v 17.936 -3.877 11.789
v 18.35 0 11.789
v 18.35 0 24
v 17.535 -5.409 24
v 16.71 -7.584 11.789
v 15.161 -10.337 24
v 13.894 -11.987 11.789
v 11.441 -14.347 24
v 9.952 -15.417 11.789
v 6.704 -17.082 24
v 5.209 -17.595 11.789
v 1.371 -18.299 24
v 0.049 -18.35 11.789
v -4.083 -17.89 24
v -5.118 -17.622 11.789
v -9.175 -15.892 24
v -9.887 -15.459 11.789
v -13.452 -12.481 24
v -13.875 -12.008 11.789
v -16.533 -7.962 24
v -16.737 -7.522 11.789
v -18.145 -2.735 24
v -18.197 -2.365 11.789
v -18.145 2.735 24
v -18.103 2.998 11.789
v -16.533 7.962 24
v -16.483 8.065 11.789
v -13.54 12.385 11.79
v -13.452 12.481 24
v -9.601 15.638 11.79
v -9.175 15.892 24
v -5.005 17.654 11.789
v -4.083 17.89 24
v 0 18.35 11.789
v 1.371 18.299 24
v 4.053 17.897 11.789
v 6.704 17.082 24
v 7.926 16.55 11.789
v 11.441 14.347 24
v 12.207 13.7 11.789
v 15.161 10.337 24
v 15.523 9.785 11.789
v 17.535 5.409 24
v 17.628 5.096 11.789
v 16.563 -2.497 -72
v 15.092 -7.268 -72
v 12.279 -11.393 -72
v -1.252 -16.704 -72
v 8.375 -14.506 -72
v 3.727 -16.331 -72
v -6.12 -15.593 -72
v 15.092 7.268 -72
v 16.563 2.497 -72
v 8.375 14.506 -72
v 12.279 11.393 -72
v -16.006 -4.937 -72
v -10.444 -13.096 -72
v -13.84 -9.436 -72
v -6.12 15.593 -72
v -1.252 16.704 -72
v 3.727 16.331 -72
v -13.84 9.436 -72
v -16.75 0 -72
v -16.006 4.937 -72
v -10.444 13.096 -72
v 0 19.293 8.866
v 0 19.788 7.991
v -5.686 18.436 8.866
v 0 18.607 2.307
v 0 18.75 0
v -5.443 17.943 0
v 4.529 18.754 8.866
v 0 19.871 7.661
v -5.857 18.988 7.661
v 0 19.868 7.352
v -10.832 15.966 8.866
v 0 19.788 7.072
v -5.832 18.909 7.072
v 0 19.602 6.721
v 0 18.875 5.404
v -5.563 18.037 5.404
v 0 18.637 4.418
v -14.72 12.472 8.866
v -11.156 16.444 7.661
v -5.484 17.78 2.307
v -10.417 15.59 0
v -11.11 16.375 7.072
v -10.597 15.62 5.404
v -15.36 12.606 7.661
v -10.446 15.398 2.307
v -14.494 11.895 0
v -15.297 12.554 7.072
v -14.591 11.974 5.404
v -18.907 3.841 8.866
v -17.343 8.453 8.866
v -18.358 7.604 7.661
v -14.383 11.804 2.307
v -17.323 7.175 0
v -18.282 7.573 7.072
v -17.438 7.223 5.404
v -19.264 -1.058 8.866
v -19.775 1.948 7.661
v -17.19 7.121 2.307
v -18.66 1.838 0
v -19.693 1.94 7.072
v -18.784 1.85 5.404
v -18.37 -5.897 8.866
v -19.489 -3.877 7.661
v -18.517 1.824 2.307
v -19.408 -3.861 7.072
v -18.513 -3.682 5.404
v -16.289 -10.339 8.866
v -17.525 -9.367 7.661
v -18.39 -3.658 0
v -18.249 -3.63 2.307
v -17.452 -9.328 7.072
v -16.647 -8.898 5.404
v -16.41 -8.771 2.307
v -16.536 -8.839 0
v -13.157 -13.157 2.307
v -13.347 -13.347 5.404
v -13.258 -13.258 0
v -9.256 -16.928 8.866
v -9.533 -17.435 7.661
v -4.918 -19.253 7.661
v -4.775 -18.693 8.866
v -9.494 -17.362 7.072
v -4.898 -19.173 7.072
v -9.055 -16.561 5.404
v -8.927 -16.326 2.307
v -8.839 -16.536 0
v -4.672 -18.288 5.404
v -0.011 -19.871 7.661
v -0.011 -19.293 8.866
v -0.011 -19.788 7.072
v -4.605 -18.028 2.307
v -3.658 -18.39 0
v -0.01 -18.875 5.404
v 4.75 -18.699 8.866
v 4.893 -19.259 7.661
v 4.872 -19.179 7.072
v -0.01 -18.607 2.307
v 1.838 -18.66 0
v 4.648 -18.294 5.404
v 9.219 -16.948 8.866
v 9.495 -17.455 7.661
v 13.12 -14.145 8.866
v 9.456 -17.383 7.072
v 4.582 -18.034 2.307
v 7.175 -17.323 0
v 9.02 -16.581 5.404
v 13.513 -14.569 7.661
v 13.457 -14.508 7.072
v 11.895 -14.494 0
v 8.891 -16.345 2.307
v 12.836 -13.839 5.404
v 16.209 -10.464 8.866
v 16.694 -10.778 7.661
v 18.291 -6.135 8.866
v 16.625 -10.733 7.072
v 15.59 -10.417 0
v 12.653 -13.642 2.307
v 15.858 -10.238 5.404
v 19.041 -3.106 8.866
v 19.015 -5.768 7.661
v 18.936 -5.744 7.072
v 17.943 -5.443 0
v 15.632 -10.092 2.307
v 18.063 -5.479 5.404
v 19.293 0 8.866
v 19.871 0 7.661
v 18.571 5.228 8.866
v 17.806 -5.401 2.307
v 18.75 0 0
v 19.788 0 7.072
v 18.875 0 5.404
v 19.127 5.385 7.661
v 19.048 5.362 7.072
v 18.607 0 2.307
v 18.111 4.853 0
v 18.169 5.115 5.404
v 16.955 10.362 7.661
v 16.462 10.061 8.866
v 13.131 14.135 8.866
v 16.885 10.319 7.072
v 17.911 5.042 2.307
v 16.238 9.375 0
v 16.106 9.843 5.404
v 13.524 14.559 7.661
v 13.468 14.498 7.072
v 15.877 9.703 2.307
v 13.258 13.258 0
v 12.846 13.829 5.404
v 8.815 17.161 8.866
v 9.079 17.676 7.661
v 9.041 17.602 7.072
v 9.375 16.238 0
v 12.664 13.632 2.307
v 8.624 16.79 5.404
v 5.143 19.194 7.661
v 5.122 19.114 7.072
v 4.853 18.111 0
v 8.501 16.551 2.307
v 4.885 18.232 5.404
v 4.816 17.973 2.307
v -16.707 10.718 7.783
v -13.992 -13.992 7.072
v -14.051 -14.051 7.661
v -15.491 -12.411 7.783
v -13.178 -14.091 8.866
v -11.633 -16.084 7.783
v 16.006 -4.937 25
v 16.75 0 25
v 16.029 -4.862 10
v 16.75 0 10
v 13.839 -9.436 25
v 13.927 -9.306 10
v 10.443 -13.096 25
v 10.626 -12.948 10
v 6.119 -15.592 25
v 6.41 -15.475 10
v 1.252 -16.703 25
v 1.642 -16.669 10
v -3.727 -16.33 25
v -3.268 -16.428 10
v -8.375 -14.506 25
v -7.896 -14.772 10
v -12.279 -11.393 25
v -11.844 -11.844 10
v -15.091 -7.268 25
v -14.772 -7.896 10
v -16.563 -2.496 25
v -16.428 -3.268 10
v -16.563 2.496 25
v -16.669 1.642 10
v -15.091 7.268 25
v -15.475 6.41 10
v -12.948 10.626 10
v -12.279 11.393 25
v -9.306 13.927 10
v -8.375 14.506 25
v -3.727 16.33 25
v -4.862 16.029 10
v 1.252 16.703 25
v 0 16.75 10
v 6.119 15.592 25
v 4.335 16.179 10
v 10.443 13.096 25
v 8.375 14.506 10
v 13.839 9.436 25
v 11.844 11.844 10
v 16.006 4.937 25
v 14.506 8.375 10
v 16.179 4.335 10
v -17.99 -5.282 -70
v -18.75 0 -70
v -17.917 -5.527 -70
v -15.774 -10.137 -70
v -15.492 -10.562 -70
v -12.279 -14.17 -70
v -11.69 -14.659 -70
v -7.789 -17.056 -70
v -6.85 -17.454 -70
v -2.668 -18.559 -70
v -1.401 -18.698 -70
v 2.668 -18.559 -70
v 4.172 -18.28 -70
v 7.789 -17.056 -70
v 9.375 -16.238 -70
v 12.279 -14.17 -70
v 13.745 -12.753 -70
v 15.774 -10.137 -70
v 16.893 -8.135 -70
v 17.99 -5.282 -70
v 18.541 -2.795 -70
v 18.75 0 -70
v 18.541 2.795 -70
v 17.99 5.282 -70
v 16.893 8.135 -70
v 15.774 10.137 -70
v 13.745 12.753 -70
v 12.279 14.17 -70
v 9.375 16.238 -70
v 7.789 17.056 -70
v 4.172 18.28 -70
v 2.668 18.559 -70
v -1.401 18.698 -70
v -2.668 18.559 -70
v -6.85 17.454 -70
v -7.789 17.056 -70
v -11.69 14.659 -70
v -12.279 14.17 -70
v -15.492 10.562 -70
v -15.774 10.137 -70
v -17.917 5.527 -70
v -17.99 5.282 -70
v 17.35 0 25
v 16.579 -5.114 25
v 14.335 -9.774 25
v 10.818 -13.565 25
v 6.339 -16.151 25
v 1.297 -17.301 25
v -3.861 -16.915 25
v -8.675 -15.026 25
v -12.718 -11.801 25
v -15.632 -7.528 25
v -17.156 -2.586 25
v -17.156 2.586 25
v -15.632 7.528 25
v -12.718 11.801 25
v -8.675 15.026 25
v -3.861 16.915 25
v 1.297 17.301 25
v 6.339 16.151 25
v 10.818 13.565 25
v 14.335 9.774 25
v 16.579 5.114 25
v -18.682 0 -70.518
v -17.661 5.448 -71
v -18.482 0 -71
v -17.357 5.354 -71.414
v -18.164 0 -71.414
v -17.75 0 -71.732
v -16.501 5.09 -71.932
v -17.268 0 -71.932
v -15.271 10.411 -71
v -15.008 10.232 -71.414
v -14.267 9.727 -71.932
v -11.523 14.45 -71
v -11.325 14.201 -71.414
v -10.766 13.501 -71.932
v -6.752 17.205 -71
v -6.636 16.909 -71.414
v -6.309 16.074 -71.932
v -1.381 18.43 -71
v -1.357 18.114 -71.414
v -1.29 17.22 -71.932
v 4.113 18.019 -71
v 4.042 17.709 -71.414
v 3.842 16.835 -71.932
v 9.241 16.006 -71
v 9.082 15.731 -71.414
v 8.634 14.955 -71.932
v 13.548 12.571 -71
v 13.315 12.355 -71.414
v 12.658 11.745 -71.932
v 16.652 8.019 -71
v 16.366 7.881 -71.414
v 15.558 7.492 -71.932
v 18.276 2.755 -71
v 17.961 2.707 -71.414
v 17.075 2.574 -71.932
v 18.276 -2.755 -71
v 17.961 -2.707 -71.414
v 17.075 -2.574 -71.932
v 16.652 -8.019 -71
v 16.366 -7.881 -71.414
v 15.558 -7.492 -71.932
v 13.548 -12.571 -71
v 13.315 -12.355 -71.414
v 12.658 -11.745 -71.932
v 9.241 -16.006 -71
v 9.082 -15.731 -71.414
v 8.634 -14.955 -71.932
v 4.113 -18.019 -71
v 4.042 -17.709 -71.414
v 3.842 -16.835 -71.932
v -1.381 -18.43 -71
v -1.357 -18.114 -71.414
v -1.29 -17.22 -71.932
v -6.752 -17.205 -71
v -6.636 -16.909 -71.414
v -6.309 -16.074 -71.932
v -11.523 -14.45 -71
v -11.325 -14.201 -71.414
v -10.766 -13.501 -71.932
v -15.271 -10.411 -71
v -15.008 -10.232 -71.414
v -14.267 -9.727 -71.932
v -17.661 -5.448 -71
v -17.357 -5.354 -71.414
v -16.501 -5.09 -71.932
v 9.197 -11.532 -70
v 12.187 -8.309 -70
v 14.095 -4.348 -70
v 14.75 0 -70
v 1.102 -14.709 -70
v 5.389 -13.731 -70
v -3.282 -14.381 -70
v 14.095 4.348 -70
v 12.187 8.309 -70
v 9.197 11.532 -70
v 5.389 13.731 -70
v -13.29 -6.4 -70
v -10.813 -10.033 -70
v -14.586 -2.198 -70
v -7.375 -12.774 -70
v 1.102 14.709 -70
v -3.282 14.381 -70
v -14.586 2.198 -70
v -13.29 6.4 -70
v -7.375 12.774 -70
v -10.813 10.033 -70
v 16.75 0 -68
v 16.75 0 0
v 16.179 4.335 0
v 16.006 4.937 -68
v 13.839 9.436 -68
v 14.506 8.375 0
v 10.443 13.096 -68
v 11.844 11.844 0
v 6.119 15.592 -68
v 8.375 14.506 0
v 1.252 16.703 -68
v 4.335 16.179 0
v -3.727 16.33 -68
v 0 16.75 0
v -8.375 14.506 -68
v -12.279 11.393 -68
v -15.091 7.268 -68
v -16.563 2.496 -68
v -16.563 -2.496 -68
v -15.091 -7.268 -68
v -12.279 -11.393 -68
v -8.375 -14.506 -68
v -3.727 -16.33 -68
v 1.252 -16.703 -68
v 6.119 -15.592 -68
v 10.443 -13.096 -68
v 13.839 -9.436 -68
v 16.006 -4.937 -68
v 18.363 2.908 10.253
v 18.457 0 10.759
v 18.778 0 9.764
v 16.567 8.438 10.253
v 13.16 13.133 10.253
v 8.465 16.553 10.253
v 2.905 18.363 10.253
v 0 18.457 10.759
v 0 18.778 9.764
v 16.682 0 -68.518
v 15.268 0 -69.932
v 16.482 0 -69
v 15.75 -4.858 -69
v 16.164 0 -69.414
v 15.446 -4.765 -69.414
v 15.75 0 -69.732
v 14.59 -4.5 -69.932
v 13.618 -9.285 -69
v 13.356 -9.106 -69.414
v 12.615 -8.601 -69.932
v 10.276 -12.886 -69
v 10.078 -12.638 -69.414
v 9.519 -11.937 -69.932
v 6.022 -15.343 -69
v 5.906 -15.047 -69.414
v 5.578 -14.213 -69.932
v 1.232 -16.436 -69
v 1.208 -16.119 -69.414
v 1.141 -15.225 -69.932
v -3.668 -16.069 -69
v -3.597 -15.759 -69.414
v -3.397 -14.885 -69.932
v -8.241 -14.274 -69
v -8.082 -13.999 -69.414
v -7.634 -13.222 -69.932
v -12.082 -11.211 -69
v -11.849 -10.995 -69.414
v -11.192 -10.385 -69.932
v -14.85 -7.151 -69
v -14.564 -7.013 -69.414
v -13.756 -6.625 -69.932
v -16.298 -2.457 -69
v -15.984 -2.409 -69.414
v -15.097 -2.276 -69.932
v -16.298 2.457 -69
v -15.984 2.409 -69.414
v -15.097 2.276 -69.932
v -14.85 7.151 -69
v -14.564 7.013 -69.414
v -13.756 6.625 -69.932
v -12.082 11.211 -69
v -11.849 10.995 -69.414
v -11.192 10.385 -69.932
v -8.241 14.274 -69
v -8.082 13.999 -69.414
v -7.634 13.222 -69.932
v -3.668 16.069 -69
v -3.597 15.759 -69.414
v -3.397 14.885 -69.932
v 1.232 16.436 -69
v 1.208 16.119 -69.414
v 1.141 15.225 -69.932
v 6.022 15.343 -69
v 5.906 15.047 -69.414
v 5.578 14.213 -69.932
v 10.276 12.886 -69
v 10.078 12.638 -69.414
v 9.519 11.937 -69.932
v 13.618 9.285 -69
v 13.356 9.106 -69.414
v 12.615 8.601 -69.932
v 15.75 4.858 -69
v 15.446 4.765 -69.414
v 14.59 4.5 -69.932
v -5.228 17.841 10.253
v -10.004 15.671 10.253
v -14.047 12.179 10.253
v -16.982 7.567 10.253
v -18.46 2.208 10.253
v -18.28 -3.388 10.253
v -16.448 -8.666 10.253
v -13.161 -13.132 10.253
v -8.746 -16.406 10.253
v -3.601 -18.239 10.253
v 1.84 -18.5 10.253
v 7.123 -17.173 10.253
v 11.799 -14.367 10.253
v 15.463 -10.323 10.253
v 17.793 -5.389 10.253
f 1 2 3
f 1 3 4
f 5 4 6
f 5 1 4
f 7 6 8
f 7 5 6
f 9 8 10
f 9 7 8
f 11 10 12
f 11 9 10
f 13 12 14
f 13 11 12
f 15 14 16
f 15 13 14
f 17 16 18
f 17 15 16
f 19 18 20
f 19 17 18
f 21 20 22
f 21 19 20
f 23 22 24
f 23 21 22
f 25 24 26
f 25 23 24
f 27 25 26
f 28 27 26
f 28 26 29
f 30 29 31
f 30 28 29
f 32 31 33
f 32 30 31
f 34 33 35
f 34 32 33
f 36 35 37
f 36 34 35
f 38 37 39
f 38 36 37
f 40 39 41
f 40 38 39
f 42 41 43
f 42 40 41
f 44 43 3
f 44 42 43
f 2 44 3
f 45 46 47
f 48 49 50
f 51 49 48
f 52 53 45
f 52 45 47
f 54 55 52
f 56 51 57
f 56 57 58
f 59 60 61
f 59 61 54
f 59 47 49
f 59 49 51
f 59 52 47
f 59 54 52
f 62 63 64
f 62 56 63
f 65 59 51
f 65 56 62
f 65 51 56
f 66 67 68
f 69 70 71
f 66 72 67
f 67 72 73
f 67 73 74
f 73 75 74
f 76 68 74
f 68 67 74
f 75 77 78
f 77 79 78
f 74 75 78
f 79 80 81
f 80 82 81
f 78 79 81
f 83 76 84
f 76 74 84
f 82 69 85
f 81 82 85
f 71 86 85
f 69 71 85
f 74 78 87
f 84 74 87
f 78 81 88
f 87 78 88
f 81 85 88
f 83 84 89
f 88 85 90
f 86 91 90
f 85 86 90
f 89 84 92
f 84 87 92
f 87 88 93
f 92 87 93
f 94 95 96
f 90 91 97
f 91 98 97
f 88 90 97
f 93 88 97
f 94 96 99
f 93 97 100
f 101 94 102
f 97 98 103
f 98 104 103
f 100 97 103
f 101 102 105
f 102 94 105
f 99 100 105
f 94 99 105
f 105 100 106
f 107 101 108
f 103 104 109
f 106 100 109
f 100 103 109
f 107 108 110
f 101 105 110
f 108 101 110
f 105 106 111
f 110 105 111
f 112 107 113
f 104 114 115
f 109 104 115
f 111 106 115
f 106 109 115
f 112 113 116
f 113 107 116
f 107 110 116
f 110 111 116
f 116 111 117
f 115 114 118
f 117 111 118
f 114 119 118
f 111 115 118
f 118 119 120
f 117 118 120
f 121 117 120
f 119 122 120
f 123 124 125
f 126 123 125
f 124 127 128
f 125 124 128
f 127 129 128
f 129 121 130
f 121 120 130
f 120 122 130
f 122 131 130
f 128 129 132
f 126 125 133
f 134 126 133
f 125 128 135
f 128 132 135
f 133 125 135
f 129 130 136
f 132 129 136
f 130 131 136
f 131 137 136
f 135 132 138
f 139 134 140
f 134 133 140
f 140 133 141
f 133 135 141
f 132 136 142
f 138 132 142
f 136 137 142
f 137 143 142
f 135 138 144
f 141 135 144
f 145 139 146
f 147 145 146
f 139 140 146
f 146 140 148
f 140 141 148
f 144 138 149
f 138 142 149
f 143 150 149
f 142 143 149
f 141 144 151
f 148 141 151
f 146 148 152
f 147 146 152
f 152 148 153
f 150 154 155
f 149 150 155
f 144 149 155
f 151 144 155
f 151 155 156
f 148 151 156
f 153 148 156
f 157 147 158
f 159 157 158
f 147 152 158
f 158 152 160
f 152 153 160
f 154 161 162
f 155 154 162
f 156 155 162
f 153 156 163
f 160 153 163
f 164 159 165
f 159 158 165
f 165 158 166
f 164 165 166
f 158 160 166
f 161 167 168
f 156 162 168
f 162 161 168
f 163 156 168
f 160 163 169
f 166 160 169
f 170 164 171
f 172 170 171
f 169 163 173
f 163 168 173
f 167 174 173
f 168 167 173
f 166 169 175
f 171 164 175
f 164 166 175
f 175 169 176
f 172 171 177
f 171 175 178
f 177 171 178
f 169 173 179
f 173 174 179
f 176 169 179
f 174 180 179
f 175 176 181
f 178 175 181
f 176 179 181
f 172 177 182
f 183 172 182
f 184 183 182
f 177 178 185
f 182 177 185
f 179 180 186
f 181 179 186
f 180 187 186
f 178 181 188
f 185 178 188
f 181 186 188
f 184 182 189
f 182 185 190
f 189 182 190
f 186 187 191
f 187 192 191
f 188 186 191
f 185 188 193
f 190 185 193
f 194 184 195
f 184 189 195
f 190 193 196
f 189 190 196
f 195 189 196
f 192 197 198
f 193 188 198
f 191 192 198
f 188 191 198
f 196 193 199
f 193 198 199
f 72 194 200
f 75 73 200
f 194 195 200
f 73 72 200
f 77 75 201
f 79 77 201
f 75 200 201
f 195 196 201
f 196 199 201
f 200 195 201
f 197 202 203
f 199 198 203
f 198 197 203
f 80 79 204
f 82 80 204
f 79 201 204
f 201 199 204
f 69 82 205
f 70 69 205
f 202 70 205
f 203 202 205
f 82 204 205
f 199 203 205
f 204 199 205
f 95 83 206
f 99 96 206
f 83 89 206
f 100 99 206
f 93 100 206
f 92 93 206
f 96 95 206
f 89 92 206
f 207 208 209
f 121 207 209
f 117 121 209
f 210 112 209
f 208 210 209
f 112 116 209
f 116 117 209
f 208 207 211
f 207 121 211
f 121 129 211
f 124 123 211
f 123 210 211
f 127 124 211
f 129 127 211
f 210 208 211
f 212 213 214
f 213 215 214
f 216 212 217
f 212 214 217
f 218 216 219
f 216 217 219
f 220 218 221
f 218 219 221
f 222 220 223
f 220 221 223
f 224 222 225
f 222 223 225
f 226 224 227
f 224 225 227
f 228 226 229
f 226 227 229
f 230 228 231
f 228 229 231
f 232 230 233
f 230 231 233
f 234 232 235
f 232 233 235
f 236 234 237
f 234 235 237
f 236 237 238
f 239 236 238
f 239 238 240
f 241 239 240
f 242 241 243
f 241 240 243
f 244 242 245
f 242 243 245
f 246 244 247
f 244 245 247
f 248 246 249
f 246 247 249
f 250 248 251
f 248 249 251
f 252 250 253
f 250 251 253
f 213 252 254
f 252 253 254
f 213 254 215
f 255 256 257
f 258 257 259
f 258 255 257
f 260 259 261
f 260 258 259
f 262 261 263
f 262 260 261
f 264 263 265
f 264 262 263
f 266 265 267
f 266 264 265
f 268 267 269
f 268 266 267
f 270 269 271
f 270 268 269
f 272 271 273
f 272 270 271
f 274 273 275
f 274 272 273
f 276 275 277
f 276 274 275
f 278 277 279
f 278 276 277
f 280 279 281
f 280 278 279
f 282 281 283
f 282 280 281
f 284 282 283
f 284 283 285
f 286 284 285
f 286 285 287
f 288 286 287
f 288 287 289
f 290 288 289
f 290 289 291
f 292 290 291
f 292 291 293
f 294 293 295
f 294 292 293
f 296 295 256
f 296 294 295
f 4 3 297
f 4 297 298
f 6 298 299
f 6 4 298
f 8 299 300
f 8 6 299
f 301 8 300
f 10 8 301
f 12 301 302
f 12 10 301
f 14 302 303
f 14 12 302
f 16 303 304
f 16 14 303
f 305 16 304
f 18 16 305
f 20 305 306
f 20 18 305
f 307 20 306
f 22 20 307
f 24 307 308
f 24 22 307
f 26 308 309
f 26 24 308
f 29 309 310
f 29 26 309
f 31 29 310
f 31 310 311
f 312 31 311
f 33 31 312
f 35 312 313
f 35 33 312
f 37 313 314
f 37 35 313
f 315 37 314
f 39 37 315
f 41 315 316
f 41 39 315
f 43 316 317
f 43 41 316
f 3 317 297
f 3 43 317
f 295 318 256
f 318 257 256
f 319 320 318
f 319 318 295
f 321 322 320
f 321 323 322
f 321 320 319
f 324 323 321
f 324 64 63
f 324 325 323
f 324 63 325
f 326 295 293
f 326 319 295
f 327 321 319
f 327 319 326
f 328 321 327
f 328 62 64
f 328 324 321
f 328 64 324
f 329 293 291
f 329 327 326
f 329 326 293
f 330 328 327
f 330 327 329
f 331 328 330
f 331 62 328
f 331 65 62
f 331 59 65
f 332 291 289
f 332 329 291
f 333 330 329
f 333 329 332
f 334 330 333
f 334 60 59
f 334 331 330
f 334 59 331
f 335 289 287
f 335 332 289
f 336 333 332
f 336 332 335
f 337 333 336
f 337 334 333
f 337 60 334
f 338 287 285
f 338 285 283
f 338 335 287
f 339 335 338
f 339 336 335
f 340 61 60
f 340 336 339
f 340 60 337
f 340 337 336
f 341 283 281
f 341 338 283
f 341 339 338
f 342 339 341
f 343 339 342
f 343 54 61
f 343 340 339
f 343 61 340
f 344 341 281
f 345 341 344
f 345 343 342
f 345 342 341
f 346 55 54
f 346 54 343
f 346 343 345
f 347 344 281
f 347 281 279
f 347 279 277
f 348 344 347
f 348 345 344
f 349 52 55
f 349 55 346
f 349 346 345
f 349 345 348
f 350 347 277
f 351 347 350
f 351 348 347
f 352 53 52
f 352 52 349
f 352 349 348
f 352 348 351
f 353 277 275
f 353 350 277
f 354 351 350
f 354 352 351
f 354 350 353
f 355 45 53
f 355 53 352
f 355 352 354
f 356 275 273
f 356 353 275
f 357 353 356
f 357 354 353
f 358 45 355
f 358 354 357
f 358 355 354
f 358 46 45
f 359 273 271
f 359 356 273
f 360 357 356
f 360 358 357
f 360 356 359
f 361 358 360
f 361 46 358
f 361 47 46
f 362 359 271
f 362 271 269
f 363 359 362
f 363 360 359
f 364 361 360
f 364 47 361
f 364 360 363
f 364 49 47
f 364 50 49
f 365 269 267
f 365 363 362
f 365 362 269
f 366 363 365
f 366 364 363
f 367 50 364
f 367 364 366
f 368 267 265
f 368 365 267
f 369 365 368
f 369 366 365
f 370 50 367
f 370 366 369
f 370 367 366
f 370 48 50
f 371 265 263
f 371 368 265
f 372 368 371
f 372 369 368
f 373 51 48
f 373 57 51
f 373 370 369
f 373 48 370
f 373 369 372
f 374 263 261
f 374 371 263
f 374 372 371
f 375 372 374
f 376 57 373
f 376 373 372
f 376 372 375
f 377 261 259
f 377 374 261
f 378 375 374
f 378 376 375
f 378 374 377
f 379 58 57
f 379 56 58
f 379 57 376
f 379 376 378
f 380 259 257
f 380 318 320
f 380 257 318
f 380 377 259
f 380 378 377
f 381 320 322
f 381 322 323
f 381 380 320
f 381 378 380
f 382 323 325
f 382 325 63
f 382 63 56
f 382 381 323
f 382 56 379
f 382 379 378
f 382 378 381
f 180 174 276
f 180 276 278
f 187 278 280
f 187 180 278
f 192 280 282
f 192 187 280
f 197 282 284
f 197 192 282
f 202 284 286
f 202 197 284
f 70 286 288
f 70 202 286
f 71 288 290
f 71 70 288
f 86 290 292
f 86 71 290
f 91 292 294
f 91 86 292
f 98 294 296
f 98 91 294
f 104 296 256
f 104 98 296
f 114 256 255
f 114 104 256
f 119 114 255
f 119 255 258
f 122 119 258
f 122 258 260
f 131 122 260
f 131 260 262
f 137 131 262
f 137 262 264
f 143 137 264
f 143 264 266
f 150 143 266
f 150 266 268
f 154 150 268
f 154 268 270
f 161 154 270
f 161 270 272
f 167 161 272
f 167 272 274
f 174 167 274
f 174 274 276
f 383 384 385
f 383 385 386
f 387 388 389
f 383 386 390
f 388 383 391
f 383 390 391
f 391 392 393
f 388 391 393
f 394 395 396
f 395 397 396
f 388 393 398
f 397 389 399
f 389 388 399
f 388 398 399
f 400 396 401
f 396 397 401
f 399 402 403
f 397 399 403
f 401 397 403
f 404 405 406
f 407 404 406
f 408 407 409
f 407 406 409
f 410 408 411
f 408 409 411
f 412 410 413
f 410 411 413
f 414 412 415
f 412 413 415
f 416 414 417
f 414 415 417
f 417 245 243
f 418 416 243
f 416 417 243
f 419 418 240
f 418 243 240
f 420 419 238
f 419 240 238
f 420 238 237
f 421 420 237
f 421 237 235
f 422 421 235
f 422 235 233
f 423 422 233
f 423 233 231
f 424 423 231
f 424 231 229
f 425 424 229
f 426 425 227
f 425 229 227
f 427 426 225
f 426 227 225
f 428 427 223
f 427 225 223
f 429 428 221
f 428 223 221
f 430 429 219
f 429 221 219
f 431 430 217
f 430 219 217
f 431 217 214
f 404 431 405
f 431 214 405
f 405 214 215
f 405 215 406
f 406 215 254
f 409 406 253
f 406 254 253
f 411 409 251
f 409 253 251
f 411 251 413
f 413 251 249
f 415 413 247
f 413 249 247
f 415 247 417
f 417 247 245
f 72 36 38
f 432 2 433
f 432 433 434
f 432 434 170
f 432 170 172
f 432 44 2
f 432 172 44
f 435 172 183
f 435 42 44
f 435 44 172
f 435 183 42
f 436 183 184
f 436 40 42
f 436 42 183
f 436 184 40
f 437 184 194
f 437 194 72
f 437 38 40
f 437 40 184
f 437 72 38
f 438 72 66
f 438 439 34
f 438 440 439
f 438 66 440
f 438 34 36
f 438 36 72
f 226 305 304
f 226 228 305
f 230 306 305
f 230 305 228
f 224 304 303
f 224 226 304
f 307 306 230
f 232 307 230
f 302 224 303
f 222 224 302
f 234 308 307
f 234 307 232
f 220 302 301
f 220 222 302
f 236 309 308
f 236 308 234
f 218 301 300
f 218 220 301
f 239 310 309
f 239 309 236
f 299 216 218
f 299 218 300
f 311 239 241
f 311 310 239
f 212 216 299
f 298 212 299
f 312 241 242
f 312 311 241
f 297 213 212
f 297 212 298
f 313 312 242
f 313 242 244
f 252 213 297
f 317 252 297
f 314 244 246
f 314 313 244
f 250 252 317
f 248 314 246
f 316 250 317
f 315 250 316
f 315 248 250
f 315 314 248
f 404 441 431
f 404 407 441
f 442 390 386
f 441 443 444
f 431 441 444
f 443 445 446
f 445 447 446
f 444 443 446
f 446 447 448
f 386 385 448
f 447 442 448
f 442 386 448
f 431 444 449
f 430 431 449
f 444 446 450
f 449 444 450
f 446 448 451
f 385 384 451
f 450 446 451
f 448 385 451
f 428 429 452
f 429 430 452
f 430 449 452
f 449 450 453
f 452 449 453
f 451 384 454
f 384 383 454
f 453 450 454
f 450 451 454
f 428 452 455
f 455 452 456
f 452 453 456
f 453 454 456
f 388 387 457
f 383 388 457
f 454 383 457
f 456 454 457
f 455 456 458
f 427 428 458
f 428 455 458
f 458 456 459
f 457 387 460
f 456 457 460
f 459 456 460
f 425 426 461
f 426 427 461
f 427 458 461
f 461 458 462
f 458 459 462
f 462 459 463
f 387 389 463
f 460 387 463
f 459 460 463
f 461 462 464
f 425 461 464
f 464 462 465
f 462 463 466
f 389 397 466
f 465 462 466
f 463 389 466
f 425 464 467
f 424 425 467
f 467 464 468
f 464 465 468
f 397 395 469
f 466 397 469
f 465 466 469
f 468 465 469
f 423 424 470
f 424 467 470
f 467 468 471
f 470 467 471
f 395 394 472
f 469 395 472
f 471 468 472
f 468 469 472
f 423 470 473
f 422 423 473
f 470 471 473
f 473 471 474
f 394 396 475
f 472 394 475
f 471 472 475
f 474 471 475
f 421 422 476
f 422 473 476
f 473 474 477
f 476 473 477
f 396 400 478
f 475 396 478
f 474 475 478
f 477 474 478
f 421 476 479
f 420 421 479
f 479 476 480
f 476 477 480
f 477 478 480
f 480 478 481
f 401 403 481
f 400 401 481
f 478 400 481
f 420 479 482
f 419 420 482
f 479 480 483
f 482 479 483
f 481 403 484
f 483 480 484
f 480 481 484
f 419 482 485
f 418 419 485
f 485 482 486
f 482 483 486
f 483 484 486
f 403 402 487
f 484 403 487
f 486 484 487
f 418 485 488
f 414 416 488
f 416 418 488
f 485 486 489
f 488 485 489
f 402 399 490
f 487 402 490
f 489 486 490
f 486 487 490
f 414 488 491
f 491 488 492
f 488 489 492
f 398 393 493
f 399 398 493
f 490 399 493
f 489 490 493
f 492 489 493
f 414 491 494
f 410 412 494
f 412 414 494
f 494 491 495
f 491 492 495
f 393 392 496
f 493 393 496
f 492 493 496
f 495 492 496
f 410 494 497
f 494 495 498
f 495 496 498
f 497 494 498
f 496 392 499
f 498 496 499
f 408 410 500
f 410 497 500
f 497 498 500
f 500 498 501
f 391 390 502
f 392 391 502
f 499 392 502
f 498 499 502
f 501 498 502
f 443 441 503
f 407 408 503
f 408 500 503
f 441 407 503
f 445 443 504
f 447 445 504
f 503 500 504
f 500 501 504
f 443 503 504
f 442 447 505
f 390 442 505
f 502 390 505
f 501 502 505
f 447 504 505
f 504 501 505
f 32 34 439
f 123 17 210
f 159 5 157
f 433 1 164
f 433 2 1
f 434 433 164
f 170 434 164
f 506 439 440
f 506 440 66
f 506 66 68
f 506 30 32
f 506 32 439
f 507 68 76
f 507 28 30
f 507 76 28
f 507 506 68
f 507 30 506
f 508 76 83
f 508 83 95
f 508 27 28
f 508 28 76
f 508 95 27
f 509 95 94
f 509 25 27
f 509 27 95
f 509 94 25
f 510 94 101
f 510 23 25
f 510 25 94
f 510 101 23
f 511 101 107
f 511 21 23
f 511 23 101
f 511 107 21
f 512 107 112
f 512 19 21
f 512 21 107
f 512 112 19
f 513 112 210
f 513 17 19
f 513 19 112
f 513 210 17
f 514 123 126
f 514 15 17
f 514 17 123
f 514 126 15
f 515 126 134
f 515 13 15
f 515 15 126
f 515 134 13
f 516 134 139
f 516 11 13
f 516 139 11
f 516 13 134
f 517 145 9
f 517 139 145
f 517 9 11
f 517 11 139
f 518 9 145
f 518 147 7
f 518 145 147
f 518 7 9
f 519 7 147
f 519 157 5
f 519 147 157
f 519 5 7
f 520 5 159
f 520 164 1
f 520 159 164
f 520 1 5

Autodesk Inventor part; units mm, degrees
ref_plane "YZ Plane" through (0, 0, 0) normal (1, 0, 0) x (0, 1, 0)
ref_plane "XZ Plane" through (0, 0, 0) normal (0, 1, 0) x (-1, 0, 0)
ref_plane "XY Plane" through (0, 0, 0) normal (0, 0, 1) x (1, 0, 0)
sketch "Skizze1" plane through (0, 0, 0) normal (0, 0, 1) x (1, 0, 0)
  circle A0 centre (0, 0) radius 18.75
  circle A1 centre (0, 0) radius 16.75
  dimension "d0" = 37.5
  dimension "d1" = 2
extrude "Extrusion1" add sketch "Skizze1" against normal blind 70
sketch "Skizze2" plane through (0, 0, -70) normal (0, 0, -1) x (-1, 0, 0)
  circle A0 centre (0, 0) radius 18.75 projected
extrude "Extrusion2" add sketch "Skizze2" along normal blind 2
fillet "Rundung1" radius 2 2 edges at (-16.75, 0, -70) (18.75, 0, -72)
sketch "Skizze3" plane through (0, 0, 0) normal (1, 0, 0) x (0, 1, 0)
  line L0 (18.75, 0) -> (18.75, -70) projected
  line L1 (-18.75, 0) -> (18.75, 0) projected
  line L2 (-16.75, 0) -> (16.75, 0) projected
  line L3 (18.75, 0) -> (16.75, 0)
  line L4 (16.75, 0) -> (16.75, 10)
  line L5 (16.75, 10) -> (18.35, 10)
  spline S0 degree 4 poles (18.35, 10) (22.5236, 5.438) (17.0645, 8.0767) (18.75, 3.082) (18.75, 0) knots 0 0 0 0 0 1 1 1 1 1
  line L6 (0, -86.0201) -> (0, 26.1206) projected
  point P0 (0, 0)
  point P1 (19.65, 6.8)
  point P2 (18.75, 5)
  dimension "d7" = 10
  dimension "d8" = 1.6
  dimension "d9" = 2
  dimension "d10" = 2.9
  dimension "d11" = 3.2
  dimension "d12" = 5
revolve "Umdrehung1" add sketch "Skizze3" angle 360 about axis through (0, 0, -10) along (0, 0, 1)
sketch "Skizze4" plane through (0, 0, 10) normal (0, 0, 1) x (1, 0, 0)
  circle A0 centre (0, 0) radius 18.35 projected
  circle A1 centre (0, 0) radius 16.75 projected
  point P0 (0, 18.35)
extrude "Extrusion3" add sketch "Skizze4" along normal blind 15
fillet "Rundung2" radius 5 2 edges at (12.9754, 12.9754, 10) (-12.9754, -12.9754, 10)
chamfer "Fase1" distance 1 angle 45 1 edges at (-18.35, 0, 25)
equation "\"G_L\" = 0"
equation "\"G_H\" = 0"
equation "\"G_B\" = 0"
properties part number "Löffelbox_unten" material "GEDA Stahl"
